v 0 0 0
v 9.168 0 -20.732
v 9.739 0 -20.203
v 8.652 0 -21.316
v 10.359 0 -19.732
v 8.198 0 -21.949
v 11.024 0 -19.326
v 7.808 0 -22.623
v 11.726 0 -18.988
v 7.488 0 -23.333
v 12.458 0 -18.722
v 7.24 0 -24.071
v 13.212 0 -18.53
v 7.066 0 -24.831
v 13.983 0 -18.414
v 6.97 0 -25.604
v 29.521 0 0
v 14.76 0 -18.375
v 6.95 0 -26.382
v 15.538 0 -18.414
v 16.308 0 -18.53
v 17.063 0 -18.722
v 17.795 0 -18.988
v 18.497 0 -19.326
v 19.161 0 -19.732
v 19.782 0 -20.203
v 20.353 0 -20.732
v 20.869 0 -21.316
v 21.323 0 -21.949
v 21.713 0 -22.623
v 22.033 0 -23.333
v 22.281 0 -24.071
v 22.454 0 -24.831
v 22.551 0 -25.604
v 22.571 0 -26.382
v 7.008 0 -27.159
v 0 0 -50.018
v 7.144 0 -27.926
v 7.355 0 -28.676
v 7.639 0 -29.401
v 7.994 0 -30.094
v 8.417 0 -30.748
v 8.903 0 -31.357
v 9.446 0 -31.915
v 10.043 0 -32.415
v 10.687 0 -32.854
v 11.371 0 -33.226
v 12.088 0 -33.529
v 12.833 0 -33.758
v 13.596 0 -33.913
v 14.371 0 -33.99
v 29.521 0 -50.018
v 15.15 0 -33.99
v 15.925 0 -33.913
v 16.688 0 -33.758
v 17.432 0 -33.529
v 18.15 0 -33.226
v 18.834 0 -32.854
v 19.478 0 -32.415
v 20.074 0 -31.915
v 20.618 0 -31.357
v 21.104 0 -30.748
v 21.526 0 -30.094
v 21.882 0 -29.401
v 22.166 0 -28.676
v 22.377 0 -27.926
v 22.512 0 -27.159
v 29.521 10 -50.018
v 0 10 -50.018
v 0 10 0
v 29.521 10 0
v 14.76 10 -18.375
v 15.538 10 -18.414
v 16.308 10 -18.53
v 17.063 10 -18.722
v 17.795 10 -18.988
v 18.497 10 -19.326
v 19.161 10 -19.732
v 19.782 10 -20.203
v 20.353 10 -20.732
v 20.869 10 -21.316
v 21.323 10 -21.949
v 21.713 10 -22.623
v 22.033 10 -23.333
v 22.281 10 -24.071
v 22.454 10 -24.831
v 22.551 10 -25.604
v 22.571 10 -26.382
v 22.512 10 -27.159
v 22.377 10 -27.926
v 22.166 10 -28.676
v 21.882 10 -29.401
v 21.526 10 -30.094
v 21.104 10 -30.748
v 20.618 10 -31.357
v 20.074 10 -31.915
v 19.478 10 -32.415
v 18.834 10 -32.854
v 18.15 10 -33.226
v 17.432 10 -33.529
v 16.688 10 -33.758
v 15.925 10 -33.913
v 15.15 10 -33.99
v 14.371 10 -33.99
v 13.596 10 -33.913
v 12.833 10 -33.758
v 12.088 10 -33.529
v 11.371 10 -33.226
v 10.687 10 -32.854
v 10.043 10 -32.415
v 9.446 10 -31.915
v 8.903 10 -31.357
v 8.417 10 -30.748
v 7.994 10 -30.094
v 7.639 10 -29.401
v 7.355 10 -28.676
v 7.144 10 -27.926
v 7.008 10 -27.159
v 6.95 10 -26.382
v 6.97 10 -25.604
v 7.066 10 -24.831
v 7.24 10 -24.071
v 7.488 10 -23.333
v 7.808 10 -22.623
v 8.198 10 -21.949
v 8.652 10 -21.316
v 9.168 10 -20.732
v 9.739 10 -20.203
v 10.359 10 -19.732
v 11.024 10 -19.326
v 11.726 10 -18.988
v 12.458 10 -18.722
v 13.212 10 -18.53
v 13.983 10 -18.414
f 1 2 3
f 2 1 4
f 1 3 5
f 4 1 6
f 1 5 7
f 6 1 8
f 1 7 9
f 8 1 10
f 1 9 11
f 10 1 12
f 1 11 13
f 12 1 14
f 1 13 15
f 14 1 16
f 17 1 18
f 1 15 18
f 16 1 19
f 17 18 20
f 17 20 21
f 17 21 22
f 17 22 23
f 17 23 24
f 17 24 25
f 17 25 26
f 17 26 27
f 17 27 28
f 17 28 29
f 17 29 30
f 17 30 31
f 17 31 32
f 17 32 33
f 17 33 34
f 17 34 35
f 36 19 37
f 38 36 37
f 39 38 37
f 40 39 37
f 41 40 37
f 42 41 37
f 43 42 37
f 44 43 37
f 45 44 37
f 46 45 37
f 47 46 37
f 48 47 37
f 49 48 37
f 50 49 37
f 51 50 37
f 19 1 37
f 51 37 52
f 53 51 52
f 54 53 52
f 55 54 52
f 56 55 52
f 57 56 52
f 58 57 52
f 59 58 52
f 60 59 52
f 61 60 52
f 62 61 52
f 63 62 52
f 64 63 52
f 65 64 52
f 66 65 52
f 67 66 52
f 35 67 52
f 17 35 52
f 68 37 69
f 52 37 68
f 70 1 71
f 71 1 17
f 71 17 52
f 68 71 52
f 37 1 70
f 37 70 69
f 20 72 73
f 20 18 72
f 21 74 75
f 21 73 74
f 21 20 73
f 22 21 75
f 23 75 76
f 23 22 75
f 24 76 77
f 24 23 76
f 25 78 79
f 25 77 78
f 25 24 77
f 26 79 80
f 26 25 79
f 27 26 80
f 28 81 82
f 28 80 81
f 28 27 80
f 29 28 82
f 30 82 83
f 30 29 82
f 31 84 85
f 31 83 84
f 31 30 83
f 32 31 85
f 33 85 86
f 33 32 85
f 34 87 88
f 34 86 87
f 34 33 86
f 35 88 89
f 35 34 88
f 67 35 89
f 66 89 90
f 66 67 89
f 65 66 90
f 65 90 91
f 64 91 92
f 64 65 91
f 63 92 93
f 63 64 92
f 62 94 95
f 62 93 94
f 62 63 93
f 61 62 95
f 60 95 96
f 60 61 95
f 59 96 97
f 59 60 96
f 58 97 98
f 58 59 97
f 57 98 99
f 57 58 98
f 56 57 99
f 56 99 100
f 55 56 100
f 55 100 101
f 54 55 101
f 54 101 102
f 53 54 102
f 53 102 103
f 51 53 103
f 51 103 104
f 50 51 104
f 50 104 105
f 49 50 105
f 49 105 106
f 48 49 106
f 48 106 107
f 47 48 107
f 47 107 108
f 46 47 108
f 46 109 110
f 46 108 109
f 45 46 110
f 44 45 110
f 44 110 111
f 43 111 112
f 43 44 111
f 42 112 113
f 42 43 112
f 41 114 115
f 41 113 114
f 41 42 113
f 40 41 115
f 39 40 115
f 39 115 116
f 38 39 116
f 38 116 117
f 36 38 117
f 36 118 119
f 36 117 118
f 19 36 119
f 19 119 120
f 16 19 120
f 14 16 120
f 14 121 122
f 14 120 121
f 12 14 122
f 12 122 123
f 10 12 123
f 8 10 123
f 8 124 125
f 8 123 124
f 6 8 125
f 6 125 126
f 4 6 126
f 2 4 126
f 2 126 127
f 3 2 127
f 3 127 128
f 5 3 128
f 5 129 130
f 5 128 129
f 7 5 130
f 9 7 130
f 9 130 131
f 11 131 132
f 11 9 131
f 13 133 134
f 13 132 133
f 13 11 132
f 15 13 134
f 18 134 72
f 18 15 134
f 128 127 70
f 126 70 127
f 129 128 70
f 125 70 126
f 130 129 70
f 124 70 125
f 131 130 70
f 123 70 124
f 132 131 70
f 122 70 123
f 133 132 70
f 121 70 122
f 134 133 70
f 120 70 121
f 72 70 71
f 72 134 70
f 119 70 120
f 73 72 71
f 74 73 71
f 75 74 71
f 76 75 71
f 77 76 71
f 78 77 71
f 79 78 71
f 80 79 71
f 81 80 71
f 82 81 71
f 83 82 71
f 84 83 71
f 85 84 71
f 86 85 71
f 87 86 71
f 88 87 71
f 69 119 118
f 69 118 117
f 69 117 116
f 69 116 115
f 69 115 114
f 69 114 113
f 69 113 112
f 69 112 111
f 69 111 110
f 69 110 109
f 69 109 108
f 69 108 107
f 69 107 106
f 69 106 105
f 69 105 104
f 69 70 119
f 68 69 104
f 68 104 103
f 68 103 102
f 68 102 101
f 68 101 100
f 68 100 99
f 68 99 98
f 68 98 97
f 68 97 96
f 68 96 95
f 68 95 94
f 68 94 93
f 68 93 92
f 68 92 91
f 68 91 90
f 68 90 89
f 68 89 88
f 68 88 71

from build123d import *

# Parameters (mm, degrees)
SKETCH1_W               = 29.520850198
SKETCH1_H               = 50.018346185
BOSS_EXTRUDE1_DEPTH     = 10
CUT_EXTRUDE1_DEPTH      = 59.934841575
CUT_EXTRUDE1_DEPTH_BACK = 59.934841575
SKETCH2_R               = 7.812618591


with BuildPart() as part:
    # Sketch1 → Boss-Extrude1 (new body)
    with BuildSketch(Plane(origin=(0, 0, 0), x_dir=(1, 0, 0), z_dir=(0, 1, 0))):
        with Locations((14.760425099, 25.009173093)):
            Rectangle(SKETCH1_W, SKETCH1_H)
    extrude(amount=BOSS_EXTRUDE1_DEPTH)

    # Sketch2 → Cut-Extrude1 (cut, two sides: drawn at the far end of the back side and taken through both)
    with BuildSketch(Plane(origin=(0, 10, 0), x_dir=(1, 0, 0), z_dir=(0, 1, 0)).offset(-CUT_EXTRUDE1_DEPTH_BACK)):
        with Locations(Location((14.760425099, 26.187461577, 0), (0, 0, 270))):
            Circle(SKETCH2_R)
    extrude(amount=CUT_EXTRUDE1_DEPTH + CUT_EXTRUDE1_DEPTH_BACK, mode=Mode.SUBTRACT)


solid = part.part
